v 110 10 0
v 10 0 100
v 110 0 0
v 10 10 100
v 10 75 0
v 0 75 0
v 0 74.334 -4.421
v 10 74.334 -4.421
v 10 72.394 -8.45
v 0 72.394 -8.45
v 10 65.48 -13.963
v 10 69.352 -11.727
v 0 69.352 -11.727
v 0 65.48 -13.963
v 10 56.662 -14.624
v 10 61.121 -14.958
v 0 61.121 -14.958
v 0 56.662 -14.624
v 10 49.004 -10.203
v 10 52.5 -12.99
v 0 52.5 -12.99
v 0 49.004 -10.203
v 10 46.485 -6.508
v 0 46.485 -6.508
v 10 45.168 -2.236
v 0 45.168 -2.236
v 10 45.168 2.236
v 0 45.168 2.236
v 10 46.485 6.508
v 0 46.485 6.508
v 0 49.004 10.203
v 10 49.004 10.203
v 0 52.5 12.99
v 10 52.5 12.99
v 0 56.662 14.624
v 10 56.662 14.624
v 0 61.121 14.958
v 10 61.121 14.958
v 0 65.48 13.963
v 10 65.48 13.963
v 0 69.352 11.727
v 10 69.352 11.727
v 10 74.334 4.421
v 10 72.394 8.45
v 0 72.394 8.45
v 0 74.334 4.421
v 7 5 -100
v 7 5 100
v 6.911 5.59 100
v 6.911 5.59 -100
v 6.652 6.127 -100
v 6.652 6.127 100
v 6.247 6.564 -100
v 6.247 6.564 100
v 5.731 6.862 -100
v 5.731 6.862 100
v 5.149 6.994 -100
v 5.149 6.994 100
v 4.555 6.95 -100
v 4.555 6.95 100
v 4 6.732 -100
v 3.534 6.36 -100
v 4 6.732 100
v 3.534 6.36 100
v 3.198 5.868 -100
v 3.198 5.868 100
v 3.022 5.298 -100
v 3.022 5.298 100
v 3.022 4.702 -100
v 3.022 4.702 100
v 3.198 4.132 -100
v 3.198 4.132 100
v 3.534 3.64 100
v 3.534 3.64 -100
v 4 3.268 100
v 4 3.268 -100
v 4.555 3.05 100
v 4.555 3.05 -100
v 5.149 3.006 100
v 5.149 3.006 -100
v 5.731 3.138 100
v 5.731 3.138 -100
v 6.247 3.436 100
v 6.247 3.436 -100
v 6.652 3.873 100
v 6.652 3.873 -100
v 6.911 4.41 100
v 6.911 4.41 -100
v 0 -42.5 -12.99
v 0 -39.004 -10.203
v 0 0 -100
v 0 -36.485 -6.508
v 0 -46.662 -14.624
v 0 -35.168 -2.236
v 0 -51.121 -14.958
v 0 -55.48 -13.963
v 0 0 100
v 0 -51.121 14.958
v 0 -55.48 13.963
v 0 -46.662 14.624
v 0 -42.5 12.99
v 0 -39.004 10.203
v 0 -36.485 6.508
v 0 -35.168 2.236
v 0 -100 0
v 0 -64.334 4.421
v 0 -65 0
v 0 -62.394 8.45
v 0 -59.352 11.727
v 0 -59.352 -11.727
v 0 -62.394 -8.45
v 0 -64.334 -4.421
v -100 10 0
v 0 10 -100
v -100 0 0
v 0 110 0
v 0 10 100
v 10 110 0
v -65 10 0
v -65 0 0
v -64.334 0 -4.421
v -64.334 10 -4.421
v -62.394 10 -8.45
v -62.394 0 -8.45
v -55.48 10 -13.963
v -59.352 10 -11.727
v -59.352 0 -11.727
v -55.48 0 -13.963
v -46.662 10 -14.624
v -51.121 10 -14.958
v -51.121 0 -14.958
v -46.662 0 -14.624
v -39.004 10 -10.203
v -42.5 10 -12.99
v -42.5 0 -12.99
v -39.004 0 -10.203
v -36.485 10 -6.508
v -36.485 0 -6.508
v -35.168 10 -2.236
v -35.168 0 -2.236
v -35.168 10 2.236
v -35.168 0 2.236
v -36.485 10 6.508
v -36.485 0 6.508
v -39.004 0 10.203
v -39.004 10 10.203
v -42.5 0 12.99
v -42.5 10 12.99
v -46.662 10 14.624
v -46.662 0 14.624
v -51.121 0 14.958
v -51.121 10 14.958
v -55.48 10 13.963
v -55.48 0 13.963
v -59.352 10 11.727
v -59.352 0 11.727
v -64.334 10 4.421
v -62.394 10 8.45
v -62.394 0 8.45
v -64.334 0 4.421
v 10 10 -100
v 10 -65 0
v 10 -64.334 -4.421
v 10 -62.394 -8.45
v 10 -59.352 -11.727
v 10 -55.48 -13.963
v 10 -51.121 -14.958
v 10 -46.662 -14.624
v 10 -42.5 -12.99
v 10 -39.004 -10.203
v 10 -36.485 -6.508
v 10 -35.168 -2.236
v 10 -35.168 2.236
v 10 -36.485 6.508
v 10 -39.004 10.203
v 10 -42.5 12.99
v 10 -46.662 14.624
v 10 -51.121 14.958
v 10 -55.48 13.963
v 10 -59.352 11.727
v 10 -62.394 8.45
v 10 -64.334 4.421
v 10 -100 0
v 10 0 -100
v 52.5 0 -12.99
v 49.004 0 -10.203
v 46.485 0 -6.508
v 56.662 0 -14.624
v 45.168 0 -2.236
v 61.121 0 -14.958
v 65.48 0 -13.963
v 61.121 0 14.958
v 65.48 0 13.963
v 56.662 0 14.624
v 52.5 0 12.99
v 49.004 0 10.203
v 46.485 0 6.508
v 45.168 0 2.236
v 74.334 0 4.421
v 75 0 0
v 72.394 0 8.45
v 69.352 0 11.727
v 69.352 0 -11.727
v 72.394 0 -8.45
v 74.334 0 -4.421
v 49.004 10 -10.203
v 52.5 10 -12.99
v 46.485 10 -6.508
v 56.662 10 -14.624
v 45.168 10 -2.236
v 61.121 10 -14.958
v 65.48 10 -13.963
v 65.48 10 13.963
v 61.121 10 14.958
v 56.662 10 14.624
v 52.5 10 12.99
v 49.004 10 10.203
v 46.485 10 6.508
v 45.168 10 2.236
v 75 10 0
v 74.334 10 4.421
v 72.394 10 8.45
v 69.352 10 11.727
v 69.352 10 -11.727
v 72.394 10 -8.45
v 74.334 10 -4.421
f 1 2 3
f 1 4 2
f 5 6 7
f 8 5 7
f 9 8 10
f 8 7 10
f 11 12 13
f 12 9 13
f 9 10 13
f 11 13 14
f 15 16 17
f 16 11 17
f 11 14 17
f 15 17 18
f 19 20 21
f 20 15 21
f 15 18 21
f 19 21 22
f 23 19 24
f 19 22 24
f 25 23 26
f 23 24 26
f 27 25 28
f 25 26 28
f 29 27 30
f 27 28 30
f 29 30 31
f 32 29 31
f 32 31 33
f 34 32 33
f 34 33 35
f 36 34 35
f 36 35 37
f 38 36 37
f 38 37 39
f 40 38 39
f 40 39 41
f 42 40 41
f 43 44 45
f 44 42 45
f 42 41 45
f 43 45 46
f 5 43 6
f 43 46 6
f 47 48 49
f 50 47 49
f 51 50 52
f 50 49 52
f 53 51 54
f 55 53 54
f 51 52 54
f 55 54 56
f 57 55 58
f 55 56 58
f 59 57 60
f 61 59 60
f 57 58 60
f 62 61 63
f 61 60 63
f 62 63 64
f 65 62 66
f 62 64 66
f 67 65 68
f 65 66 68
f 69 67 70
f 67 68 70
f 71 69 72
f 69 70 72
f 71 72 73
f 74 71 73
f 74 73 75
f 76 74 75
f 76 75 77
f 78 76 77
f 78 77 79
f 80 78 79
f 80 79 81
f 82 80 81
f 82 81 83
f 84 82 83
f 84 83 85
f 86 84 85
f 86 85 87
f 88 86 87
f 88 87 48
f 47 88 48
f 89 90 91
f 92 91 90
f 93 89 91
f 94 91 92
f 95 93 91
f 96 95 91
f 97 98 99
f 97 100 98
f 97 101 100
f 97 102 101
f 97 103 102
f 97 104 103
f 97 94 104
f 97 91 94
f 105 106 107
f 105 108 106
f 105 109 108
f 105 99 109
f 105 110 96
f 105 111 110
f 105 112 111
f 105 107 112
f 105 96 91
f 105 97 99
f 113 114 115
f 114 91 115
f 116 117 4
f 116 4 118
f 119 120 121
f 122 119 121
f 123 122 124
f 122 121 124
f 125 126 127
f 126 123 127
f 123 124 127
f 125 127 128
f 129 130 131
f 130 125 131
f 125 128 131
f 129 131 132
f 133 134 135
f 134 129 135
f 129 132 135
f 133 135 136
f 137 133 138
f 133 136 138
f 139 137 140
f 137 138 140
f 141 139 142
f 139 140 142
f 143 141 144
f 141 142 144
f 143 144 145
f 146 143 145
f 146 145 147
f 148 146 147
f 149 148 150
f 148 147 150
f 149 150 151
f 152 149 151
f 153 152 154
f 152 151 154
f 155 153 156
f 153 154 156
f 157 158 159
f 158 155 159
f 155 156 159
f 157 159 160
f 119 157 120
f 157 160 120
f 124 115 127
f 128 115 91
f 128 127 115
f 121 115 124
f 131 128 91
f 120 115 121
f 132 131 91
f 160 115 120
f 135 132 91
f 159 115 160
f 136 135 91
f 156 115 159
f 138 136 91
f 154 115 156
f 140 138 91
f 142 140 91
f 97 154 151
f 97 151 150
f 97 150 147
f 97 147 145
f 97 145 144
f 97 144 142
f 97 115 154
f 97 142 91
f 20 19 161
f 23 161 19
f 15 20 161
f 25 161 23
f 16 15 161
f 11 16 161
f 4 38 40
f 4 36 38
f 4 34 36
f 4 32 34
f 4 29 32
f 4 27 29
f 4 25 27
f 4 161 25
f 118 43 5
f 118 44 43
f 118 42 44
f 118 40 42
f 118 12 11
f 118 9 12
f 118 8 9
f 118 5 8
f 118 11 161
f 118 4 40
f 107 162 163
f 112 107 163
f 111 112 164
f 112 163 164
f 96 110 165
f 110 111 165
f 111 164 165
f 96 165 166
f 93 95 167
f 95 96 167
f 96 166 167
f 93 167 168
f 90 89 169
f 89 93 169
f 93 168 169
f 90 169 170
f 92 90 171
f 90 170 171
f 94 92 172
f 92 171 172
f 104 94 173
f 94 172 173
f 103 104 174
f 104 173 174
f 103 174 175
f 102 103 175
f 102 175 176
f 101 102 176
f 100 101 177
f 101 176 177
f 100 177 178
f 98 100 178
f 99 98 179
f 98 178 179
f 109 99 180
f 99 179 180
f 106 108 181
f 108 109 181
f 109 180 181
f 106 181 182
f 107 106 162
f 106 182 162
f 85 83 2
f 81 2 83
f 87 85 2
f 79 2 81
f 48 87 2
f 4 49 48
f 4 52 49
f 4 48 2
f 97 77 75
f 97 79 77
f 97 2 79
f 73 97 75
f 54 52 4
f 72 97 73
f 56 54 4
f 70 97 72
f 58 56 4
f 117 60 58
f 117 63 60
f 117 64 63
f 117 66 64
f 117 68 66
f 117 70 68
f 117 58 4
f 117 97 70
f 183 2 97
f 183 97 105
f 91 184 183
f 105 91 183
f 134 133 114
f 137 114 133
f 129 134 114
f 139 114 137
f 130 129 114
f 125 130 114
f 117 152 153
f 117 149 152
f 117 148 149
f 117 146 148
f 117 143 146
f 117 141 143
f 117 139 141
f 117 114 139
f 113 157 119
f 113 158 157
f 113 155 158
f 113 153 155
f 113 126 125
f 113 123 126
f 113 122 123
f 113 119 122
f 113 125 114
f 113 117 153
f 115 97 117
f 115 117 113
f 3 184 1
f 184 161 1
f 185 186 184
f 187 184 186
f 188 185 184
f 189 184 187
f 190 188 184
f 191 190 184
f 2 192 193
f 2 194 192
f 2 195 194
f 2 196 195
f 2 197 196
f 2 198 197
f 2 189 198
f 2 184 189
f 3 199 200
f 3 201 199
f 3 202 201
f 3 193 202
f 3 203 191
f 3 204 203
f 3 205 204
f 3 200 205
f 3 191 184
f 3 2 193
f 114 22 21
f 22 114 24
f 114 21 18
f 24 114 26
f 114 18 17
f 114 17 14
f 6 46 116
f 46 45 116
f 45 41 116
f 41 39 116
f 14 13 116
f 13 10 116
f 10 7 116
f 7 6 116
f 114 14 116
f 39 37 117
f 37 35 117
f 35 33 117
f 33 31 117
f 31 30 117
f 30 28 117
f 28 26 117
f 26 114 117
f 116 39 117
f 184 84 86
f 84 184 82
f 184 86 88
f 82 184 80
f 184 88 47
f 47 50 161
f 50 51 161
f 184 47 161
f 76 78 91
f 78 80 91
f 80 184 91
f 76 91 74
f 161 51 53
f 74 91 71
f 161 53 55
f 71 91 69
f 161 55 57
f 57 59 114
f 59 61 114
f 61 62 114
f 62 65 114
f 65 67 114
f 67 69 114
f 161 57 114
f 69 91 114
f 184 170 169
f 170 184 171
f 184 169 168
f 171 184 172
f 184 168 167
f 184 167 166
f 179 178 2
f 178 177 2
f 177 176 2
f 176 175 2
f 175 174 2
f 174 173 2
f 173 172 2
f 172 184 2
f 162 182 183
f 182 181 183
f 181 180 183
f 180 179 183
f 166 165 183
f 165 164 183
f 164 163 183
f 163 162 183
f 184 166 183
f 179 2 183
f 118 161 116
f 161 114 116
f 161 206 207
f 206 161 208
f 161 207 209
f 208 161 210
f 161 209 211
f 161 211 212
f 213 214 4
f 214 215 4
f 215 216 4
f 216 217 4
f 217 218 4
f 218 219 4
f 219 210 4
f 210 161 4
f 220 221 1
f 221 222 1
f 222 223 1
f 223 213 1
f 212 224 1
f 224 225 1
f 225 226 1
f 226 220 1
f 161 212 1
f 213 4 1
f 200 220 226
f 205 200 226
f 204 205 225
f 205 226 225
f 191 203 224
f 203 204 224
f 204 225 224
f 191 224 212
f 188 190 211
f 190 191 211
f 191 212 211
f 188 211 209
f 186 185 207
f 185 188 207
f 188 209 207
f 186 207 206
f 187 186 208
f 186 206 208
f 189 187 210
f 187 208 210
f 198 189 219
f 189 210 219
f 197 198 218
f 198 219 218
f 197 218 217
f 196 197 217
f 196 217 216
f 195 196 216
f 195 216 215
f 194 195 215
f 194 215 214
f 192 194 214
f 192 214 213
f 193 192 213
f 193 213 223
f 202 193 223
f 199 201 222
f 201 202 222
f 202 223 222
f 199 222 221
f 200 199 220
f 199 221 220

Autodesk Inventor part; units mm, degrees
ref_plane "YZ Plane" through (0, 0, 0) normal (1, 0, 0) x (0, 1, 0)
ref_plane "XZ Plane" through (0, 0, 0) normal (0, 1, 0) x (-1, 0, 0)
ref_plane "XY Plane" through (0, 0, 0) normal (0, 0, 1) x (1, 0, 0)
sketch "Sketch1" plane through (0, 0, 0) normal (0, 1, 0) x (-1, 0, 0)
  point P0 (0, 0)
sketch "Sketch2" plane through (0, 0, 0) normal (0, 1, 0) x (-1, 0, 0)
  line L0 (0, 0) -> (0, -100)
  line L1 (0, -100) -> (100, 0)
  line L2 (100, 0) -> (0, 0) construction
  line L3 (0, 0) -> (0, 100)
  line L4 (0, 100) -> (100, 0)
  circle A0 centre (50, 0) radius 15
  dimension "d0" = 100
  dimension "d1" = 45
  dimension "d2" = 30
  dimension "d3" = 50
extrude "Extrusion1" add sketch "Sketch2" along normal blind 10
sketch "Sketch3" plane through (0, 0, 100) normal (1, 0, 0) x (0, 0, -1)
  line L0 (0, 0) -> (200, 0) projected
  line L1 (200, 0) -> (200, 10) projected
  line L2 (0, 10) -> (200, 10) projected
  line L3 (0, 0) -> (0, 10) projected
  point P0 (100, 0)
extrude "Extrusion2" add sketch "Sketch3" along normal blind 10
sketch "Sketch4" plane through (0, 0, 100) normal (0, 0, 1) x (1, 0, 0)
  circle A0 centre (5, 5) radius 2
  line L0 (0, 10) -> (10, 10) projected
  line L1 (10, 10) -> (10, 0) projected
  point P0 (0, 0)
  dimension "d8" = 4
  dimension "d9" = 5
  dimension "d10" = 5
extrude "Extrusion3" cut sketch "Sketch4" against normal blind 252.8875
pattern_circular "Circular Pattern1" count 4 over 360 about axis through (5, 5, 100) along (0, 0, -1) of "Extrusion1"
properties part number "MainStructure"
